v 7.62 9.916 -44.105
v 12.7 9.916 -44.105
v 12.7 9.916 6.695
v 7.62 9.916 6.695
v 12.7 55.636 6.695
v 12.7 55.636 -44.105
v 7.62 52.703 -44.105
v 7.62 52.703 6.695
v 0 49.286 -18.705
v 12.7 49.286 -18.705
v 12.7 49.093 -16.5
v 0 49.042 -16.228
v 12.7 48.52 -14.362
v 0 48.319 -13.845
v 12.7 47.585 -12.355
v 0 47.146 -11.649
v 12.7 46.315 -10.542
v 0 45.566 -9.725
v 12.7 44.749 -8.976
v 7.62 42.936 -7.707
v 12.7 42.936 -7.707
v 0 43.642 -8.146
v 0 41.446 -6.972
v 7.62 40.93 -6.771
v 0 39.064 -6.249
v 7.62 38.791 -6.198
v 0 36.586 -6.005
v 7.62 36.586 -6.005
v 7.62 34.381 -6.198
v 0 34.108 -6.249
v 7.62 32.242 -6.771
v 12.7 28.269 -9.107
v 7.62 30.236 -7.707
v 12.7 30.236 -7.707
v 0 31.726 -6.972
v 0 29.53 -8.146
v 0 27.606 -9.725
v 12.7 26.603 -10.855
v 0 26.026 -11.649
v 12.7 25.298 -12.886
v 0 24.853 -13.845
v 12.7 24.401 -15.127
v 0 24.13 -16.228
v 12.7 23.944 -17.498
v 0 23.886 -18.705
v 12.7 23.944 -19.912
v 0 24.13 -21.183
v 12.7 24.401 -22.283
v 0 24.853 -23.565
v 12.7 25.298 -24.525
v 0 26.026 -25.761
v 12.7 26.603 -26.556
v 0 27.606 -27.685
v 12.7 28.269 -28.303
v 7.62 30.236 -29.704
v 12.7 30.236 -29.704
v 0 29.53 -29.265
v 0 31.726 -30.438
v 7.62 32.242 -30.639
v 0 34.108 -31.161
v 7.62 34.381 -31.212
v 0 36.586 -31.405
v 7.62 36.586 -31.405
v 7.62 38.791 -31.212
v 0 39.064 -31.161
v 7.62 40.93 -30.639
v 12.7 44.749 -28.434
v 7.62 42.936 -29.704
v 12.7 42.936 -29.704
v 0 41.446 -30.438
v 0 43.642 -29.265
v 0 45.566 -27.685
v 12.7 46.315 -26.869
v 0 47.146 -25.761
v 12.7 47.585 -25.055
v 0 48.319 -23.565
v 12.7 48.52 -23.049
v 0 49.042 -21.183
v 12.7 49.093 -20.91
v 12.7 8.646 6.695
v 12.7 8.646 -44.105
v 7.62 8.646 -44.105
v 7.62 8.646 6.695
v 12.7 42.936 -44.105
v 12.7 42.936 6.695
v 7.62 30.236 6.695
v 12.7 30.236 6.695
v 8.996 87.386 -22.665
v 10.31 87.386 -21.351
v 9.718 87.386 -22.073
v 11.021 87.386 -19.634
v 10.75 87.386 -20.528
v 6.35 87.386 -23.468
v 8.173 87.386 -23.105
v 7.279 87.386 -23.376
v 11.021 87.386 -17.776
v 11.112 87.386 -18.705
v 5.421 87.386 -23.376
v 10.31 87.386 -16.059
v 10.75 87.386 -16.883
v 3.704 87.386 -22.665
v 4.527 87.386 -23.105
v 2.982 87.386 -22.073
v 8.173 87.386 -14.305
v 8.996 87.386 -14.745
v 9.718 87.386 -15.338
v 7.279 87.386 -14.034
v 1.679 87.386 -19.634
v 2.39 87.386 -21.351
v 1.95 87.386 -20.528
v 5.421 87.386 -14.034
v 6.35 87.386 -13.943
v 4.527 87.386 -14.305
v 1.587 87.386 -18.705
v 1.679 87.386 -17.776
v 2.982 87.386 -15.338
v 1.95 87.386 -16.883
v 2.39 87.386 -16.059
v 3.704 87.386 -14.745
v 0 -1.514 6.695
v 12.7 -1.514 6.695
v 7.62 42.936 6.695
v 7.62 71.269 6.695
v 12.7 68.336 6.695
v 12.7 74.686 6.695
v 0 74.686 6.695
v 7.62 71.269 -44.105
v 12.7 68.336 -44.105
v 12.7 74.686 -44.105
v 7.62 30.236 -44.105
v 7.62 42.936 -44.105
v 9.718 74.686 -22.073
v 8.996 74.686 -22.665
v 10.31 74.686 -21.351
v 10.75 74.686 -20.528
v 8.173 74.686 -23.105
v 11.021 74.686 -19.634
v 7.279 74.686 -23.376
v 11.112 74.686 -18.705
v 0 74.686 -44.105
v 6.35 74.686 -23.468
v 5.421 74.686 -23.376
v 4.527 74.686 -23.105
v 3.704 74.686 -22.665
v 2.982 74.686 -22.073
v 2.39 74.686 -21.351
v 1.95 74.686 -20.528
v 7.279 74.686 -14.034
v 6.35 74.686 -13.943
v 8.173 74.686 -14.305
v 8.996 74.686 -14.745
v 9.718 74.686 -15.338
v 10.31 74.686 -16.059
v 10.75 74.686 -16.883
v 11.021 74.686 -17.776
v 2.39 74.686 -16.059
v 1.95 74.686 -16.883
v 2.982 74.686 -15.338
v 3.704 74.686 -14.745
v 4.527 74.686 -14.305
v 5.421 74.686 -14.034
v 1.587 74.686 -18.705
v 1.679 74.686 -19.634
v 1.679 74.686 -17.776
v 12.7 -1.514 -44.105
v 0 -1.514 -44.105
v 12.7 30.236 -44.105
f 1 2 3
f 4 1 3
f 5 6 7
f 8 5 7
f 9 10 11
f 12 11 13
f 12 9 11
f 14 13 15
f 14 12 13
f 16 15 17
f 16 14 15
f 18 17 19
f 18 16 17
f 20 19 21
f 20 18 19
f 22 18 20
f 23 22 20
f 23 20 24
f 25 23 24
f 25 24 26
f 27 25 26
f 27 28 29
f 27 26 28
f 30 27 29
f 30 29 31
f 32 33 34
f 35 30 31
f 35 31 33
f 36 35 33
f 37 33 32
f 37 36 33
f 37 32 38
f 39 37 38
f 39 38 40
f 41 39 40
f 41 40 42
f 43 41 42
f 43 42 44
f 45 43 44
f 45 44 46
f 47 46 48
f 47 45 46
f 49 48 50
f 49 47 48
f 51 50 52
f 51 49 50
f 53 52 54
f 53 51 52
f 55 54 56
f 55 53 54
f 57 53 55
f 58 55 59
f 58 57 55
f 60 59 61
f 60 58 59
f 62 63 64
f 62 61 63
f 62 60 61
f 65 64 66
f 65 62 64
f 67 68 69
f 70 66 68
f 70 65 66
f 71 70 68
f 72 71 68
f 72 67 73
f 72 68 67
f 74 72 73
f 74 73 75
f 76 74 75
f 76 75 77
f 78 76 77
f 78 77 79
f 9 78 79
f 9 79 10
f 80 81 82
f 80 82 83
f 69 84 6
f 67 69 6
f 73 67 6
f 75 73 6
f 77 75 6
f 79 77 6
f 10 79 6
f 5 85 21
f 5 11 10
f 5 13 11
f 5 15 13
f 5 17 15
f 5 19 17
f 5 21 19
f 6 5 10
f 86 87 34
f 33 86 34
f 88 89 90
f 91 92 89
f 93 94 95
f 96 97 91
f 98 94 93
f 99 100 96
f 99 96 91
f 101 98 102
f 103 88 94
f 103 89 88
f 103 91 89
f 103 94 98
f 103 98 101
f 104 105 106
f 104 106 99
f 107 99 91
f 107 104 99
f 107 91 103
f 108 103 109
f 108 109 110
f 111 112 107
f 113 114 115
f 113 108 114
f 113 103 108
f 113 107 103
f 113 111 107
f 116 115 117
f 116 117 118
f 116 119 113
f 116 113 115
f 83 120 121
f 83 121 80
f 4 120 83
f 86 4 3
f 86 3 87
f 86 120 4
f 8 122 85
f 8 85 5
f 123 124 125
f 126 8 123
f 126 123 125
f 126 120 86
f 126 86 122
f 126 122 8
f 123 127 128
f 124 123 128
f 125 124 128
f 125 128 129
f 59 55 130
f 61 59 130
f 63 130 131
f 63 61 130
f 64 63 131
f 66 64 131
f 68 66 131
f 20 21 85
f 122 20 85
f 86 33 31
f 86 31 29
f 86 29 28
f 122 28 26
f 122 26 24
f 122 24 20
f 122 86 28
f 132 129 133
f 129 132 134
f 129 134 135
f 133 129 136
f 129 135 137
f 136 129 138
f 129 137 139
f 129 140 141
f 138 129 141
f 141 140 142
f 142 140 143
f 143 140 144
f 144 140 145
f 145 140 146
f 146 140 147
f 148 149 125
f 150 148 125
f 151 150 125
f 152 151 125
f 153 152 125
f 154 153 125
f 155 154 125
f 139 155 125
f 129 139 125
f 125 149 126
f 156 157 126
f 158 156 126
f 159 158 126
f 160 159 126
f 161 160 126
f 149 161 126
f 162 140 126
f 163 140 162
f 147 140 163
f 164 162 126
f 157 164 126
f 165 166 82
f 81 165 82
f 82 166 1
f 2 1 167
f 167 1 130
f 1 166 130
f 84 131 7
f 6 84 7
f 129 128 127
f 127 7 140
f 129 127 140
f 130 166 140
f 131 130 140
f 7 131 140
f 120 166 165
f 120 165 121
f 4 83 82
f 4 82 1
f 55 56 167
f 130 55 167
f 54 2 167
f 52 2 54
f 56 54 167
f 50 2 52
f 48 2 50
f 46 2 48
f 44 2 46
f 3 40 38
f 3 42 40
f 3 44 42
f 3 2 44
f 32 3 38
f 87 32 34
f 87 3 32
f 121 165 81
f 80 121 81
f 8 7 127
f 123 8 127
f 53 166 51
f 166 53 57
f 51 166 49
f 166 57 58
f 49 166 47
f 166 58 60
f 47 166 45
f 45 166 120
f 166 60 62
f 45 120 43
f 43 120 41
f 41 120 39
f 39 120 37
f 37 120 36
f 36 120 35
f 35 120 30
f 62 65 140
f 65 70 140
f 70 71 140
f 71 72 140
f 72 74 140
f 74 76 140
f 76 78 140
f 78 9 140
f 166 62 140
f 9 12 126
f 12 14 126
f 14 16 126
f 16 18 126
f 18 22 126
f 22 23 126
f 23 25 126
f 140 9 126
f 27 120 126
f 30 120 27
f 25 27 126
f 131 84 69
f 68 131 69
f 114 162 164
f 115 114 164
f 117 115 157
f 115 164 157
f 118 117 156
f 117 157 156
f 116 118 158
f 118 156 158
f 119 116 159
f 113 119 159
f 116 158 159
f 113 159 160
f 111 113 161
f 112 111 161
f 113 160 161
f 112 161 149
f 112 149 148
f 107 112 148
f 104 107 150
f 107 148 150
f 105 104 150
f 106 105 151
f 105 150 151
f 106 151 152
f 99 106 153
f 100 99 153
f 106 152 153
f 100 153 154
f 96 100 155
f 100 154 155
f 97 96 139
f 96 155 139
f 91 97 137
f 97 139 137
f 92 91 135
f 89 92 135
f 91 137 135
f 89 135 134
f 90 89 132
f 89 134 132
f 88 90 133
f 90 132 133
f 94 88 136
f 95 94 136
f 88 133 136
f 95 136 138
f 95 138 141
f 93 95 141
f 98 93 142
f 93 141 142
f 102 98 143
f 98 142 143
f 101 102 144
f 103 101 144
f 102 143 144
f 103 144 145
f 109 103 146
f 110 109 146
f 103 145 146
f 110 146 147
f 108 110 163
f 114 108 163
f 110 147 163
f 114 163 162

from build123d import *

# Parameters (mm, degrees)
F0_W     = 76.2
F0_H     = 50.8
F0_R     = 12.7
F1_DEPTH = 12.7
F2_W     = 1.27
F2_H     = 50.8
F3_DEPTH = 5.08
F5_DEPTH = 50.801
F6_R     = 4.7625
F7_DEPTH = 12.7


with BuildPart() as f1:
    # F0 (on Right) → F1 (new body)
    with BuildSketch(Plane.YZ):
        with Locations((36.5860867262, -18.7051647067)):
            Rectangle(F0_W, F0_H)
        with Locations((36.5860867262, -18.7051647067)):
            Circle(F0_R, mode=Mode.SUBTRACT)
    extrude(amount=F1_DEPTH)

    # F2 (on face) → F3 (cut)
    with BuildSketch(Plane.YZ.offset(12.7)):
        with Locations((9.2810867262, -18.7051647067)):
            Rectangle(F2_W, F2_H)
        with BuildLine():
            Line((42.9360867262, 6.6948352933), (30.2360867262, 6.6948352933))
            Line((30.2360867262, 6.6948352933), (30.2360867262, -7.7066420786))
            ThreePointArc((30.2360867262, -7.7066420786), (36.5860867262, -6.0051647067), (42.9360867262, -7.7066420786))
            Line((42.9360867262, -7.7066420786), (42.9360867262, 6.6948352933))
        make_face()
        with BuildLine():
            Line((30.2360867262, -29.7036873348), (30.2360867262, -44.1051647067))
            Line((30.2360867262, -44.1051647067), (42.9360867262, -44.1051647067))
            Line((42.9360867262, -44.1051647067), (42.9360867262, -29.7036873348))
            ThreePointArc((42.9360867262, -29.7036873348), (36.5860867262, -31.4051647067), (30.2360867262, -29.7036873348))
        make_face()
    extrude(amount=-F3_DEPTH, mode=Mode.SUBTRACT)

    # F4 (on face) → F5 (cut, through all)
    with BuildSketch(Plane(origin=(0, 0, -44.1051647067), x_dir=(1, 0, 0), z_dir=(0, 0, -1))):
        Polygon((12.7, -68.3360867262), (12.7, -55.6360867262), (7.62, -52.7031473587), (7.62, -71.2690260937), align=None)
    extrude(amount=-F5_DEPTH, mode=Mode.SUBTRACT)

    # F6 (on face) → F7 (join)
    with BuildSketch(Plane(origin=(0, 74.6860867262, 0), x_dir=(-1, 0, 0), z_dir=(0, 1, 0))):
        with Locations((-6.35, -18.7051647067)):
            Circle(F6_R)
    extrude(amount=F7_DEPTH)


solid = f1.part
